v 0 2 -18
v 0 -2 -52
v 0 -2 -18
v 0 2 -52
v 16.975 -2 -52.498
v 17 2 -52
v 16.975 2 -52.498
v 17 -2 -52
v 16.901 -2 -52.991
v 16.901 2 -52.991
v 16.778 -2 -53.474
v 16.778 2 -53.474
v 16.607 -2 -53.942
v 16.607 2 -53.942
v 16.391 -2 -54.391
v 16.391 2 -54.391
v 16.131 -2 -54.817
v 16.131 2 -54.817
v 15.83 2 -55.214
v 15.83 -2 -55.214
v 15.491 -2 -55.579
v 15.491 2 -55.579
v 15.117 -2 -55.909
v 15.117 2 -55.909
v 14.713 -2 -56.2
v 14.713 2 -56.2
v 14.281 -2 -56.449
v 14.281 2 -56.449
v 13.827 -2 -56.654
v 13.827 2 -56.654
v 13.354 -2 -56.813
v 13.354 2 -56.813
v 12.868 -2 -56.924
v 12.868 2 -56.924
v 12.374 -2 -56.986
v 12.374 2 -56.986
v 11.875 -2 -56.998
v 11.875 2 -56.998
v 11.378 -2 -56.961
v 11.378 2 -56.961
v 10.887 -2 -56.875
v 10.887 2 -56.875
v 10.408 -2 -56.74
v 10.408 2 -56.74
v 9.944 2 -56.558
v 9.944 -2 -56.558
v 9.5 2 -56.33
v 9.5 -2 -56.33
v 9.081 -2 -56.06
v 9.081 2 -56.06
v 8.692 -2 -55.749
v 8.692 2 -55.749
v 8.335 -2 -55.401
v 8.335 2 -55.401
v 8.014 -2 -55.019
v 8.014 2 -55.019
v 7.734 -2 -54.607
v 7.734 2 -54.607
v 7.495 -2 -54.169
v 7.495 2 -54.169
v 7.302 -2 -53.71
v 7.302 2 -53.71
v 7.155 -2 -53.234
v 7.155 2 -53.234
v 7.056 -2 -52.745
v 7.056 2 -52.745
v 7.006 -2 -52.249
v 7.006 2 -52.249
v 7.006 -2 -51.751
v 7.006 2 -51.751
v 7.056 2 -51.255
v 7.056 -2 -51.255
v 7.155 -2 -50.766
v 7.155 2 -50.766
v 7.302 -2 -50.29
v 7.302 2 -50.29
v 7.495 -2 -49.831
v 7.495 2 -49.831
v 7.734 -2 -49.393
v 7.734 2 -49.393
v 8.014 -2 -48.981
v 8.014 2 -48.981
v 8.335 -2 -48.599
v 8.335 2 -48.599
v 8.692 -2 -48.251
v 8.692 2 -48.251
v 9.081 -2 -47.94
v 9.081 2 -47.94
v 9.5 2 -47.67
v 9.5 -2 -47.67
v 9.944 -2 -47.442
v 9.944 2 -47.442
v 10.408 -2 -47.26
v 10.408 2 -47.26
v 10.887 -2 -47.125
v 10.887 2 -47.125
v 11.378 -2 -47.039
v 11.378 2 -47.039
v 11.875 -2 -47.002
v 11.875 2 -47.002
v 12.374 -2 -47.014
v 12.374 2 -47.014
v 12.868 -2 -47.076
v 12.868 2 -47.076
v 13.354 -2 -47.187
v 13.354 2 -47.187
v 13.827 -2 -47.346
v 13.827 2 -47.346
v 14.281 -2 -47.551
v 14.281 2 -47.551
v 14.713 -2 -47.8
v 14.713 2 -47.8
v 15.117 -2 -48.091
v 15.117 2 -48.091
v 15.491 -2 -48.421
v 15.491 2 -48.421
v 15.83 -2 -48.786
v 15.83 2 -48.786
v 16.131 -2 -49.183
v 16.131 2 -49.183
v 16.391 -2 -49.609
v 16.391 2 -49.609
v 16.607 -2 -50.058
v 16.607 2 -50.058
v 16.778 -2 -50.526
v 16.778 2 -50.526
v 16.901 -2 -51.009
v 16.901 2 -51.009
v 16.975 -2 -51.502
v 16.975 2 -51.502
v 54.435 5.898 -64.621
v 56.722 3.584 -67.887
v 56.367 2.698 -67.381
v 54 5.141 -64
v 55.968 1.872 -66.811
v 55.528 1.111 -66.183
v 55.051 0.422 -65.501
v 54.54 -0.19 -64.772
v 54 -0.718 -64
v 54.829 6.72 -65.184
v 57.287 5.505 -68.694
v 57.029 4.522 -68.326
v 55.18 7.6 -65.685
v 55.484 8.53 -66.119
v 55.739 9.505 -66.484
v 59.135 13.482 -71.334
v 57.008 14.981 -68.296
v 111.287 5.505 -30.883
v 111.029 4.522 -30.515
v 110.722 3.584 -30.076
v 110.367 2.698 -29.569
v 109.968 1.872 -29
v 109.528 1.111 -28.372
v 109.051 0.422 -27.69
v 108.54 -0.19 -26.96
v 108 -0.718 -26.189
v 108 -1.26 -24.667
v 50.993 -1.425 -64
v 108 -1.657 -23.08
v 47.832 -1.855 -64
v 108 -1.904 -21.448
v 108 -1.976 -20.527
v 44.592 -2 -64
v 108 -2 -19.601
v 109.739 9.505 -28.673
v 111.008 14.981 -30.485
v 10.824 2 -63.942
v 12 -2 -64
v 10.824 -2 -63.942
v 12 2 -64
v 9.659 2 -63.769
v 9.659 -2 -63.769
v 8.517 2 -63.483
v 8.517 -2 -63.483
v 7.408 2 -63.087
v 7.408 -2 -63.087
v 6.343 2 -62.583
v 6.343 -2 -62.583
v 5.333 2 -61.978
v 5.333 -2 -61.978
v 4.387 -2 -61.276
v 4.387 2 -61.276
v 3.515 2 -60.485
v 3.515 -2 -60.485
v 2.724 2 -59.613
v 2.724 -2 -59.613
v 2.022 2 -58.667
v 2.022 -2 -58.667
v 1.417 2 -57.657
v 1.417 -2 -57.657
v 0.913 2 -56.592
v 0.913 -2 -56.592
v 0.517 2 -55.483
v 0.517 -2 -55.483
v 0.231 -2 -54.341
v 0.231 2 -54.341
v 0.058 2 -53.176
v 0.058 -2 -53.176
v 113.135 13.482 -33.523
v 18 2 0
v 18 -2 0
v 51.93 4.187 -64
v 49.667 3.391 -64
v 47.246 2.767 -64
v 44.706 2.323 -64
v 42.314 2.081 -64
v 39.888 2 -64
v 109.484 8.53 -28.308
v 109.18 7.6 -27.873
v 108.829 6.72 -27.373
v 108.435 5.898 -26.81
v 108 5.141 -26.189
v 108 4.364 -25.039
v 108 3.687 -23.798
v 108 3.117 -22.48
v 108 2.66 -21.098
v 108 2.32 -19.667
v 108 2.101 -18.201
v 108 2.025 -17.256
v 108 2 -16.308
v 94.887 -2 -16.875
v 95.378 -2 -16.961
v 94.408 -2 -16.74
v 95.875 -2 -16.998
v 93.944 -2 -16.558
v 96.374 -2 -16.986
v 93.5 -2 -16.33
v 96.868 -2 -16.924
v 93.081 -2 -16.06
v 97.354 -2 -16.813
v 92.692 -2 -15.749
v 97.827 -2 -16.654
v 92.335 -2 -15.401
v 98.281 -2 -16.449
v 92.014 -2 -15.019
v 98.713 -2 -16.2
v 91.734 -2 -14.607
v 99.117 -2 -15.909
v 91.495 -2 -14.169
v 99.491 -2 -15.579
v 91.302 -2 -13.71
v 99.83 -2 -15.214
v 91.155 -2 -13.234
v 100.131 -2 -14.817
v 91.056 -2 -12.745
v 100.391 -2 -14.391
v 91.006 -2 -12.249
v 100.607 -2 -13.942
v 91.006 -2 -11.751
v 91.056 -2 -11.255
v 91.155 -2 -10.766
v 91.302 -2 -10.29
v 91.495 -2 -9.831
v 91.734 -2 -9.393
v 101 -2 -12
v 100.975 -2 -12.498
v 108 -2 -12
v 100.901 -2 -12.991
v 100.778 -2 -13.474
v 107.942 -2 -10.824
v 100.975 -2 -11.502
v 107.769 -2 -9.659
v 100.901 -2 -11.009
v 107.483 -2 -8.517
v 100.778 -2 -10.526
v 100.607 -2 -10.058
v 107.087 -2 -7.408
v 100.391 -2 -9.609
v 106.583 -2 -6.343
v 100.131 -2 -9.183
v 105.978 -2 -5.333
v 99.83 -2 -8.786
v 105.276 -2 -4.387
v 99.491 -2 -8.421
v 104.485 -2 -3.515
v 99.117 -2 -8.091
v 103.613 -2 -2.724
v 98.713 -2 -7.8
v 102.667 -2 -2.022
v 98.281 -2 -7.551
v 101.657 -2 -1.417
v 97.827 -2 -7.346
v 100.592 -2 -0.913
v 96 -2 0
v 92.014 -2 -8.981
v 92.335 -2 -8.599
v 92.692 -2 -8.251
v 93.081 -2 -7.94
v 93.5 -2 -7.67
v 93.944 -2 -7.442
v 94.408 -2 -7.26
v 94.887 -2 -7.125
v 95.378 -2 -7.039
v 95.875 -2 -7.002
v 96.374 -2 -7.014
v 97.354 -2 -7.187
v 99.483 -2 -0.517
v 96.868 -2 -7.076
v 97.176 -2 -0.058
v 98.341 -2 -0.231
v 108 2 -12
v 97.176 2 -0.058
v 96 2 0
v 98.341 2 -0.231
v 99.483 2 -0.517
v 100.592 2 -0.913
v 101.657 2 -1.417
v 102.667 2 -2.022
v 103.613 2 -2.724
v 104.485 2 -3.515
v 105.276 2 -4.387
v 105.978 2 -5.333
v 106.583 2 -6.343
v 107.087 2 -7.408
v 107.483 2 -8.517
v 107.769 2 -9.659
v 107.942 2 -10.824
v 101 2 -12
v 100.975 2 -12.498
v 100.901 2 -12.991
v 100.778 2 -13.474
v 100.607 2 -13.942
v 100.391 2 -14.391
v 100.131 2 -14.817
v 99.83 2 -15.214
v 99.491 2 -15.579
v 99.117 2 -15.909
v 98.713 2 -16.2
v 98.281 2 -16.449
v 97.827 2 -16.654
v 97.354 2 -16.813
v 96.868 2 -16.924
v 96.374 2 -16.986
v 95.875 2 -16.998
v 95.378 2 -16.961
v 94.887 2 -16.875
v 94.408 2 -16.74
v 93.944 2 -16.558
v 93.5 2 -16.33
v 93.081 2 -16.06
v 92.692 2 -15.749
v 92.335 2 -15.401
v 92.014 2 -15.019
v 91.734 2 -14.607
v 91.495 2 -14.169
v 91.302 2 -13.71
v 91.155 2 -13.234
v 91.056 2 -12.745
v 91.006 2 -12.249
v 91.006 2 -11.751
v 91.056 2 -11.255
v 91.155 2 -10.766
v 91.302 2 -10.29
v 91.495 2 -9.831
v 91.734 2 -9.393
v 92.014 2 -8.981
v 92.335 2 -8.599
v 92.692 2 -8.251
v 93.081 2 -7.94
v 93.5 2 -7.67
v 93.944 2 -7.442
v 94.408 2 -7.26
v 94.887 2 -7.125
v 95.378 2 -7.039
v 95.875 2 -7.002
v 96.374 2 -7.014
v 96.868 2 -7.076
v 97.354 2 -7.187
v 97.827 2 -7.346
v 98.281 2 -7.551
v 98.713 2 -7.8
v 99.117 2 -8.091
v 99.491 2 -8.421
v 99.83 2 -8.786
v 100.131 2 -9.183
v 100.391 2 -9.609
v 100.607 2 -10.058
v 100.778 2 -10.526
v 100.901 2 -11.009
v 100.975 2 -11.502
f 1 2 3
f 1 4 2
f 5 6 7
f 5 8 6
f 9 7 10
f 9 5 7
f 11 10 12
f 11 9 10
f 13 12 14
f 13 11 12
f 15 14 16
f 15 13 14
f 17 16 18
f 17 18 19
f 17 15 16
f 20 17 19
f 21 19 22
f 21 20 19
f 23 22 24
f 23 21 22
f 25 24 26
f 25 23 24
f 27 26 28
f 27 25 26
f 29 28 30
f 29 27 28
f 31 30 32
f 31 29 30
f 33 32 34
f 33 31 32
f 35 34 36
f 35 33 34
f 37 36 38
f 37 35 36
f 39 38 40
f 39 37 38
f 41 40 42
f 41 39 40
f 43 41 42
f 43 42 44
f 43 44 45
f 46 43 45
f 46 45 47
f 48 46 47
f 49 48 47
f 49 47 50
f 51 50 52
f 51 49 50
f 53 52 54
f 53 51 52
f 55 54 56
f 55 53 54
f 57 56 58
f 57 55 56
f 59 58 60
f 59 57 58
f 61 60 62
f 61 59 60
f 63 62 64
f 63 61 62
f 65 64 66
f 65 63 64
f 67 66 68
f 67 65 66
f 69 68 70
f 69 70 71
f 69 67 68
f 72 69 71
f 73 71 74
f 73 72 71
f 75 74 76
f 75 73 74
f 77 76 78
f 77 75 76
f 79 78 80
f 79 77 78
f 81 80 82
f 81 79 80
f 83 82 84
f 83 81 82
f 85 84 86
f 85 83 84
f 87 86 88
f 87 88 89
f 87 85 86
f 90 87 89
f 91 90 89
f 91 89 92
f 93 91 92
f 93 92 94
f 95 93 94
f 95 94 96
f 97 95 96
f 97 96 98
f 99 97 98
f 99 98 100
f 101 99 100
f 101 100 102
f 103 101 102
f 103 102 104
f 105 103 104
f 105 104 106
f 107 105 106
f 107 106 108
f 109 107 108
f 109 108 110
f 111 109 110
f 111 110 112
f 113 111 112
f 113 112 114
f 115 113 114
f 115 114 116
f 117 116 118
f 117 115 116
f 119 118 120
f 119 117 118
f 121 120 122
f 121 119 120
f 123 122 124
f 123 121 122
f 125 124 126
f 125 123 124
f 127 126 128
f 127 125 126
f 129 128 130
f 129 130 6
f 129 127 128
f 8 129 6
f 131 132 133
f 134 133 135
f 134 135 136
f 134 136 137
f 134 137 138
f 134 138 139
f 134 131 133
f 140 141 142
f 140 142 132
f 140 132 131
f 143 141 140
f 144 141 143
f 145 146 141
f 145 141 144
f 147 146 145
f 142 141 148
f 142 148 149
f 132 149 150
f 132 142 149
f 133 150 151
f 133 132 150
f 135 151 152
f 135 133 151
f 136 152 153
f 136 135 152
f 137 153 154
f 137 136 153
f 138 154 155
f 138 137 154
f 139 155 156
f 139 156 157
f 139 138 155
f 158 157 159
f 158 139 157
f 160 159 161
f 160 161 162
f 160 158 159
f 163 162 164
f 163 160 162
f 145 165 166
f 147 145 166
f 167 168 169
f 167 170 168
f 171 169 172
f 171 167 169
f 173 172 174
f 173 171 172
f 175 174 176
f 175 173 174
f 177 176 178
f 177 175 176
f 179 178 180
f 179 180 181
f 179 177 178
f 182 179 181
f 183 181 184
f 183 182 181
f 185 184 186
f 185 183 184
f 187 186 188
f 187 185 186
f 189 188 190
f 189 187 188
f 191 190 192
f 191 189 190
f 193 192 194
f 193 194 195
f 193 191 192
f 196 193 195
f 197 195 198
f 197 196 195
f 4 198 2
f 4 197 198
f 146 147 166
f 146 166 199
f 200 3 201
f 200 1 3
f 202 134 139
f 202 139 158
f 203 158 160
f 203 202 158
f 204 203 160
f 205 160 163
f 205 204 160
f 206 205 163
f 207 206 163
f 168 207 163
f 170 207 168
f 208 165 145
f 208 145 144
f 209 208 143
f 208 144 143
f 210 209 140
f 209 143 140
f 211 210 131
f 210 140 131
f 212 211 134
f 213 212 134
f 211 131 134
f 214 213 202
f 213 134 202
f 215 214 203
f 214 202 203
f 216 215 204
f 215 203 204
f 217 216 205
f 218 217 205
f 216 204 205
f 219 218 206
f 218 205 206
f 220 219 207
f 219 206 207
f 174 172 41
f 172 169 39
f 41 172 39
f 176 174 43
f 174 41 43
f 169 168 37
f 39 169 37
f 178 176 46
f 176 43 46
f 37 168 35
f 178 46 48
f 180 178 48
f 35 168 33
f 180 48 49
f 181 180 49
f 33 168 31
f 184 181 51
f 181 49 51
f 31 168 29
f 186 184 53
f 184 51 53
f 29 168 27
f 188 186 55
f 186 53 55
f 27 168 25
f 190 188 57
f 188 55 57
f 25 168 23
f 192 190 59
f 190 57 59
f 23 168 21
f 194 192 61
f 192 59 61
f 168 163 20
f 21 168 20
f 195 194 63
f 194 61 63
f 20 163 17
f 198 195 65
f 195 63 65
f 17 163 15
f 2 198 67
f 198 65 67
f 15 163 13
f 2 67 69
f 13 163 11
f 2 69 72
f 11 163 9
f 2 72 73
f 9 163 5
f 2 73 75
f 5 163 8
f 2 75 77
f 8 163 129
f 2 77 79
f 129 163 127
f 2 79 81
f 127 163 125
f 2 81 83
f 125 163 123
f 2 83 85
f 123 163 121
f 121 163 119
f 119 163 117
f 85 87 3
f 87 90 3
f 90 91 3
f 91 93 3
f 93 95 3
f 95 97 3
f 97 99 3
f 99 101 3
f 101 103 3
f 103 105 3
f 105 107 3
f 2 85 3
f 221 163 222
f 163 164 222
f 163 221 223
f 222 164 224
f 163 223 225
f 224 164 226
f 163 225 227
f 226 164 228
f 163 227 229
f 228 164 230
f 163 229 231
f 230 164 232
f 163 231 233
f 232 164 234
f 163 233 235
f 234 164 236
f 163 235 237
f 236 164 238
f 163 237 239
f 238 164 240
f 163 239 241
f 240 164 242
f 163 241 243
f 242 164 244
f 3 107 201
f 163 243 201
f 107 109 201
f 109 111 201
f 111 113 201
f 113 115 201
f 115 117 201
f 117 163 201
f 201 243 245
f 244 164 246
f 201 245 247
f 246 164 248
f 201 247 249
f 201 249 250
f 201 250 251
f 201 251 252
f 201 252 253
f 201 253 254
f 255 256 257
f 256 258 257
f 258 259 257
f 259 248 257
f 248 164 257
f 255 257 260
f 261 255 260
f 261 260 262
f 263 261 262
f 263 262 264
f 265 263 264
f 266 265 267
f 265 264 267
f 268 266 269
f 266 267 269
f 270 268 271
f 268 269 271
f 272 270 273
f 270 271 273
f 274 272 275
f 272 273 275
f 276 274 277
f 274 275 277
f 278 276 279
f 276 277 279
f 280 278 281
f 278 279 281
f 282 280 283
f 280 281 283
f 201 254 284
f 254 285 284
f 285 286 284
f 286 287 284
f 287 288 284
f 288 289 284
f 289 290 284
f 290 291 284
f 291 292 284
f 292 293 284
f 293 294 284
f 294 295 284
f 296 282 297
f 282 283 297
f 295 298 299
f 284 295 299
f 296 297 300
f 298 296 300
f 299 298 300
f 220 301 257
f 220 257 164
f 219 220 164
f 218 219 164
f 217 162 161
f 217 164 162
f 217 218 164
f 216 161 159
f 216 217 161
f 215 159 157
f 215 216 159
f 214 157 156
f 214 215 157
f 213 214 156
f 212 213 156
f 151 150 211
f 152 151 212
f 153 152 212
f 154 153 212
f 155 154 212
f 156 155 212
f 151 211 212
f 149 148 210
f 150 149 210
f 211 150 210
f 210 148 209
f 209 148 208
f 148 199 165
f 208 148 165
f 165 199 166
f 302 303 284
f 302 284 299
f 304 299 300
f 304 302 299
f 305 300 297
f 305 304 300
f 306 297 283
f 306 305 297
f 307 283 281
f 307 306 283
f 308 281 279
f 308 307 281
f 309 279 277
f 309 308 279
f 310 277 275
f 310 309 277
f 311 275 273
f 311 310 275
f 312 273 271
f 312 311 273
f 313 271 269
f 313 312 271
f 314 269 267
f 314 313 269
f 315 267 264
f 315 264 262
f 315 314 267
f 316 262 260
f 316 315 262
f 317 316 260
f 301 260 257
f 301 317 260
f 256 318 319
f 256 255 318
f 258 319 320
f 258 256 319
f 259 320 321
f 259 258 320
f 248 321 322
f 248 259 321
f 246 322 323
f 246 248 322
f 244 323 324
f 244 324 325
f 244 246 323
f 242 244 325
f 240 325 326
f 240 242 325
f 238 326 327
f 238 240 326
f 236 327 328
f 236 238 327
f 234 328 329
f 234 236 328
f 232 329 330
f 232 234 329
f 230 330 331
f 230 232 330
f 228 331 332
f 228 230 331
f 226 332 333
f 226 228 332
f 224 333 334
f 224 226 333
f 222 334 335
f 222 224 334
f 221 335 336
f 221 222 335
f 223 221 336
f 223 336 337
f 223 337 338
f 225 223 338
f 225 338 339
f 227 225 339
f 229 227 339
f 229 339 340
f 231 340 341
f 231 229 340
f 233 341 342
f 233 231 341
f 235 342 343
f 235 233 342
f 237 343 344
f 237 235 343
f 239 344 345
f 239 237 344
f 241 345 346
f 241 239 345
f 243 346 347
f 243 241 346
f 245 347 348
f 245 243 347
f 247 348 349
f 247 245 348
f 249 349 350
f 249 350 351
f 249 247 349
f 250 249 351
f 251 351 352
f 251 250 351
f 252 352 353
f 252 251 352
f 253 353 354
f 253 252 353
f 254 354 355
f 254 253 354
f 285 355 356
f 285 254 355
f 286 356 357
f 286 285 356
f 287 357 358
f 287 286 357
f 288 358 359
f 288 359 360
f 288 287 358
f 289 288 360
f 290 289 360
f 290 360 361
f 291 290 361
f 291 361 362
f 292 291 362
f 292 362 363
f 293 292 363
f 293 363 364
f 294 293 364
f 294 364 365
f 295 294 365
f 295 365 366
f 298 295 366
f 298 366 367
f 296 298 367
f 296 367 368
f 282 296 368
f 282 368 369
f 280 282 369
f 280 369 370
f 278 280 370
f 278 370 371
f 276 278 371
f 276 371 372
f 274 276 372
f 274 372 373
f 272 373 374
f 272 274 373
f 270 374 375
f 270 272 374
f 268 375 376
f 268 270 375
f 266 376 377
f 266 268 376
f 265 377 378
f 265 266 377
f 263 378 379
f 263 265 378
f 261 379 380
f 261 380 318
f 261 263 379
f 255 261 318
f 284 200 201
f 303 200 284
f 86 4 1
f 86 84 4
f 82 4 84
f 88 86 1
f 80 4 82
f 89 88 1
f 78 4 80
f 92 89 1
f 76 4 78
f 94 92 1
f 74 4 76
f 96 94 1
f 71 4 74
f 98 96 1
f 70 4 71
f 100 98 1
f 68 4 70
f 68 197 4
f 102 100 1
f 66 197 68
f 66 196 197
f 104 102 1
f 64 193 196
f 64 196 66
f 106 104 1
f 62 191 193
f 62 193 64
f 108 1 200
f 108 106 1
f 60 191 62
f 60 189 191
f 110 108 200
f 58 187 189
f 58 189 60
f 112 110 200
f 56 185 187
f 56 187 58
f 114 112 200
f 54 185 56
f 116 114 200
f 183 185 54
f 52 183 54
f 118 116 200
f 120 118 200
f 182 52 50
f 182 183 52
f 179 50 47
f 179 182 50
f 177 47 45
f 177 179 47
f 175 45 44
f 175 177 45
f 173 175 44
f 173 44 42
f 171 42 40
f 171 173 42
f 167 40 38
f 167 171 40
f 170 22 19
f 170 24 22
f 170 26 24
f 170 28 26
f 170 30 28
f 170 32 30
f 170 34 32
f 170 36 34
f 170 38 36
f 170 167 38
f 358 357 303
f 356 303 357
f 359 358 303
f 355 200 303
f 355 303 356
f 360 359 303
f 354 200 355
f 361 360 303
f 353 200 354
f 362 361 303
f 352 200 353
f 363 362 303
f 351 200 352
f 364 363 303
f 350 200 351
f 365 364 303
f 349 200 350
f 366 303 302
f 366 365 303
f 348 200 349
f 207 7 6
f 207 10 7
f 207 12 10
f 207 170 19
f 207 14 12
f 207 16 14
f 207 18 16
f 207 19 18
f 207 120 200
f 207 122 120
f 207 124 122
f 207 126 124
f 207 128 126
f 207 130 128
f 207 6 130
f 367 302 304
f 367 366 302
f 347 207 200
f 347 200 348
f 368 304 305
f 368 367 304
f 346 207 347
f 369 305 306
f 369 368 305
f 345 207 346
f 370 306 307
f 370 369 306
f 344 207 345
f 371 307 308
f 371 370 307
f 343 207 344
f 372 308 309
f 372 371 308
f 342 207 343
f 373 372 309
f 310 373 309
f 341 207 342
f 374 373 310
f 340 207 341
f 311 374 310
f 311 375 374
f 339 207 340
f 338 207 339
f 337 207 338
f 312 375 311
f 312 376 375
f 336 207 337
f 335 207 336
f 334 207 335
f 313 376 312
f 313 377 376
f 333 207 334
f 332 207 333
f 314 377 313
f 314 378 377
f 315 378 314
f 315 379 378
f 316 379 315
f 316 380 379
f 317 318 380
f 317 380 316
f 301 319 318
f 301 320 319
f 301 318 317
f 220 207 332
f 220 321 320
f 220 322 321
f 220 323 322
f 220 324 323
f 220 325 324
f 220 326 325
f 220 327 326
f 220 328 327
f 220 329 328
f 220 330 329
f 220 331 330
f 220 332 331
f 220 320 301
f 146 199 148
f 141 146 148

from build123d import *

# Parameters (mm, degrees)
SKETCH1_R           = 5
BOSS_EXTRUDE1_DEPTH = 2
BOSS_EXTRUDE2_DEPTH = 65.921828
FILLET1_R           = 12
FILLET2_R           = 12


with BuildPart() as part:
    # Sketch1 → Boss-Extrude1 (new body, symmetric)
    with BuildSketch(Plane(origin=(0, 0, 0), x_dir=(1, 0, 0), z_dir=(0, 1, 0))):
        with BuildLine():
            Line((0, 18), (18, 0))
            Line((18, 0), (96, 0))
            ThreePointArc((96, 0), (104.485281374, 3.514718626), (108, 12))
            Line((108, 12), (108, 26.188792937))
            Line((108, 26.188792937), (54, 64))
            Line((54, 64), (12, 64))
            ThreePointArc((12, 64), (3.514718626, 60.485281374), (0, 52))
            Line((0, 52), (0, 18))
        make_face()
        with Locations((12, 52)):
            Circle(SKETCH1_R, mode=Mode.SUBTRACT)
        with Locations((96, 12)):
            Circle(SKETCH1_R, mode=Mode.SUBTRACT)
    extrude(amount=BOSS_EXTRUDE1_DEPTH, both=True)

    # Sketch4 → Boss-Extrude2 (add)
    with BuildSketch(Plane(origin=(60.164380005, 0, 42.127552411), x_dir=(0.573576436, 0, -0.819152044), z_dir=(0.819152044, 0, 0.573576436))):
        Polygon((83.398858397, 2), (88.643350705, 14.980573964), (92.352086124, 13.48214759), (86.096892465, -2), (83.398858397, -2), align=None)
    extrude(amount=-BOSS_EXTRUDE2_DEPTH)

    # Fillet1
    fillet1_edges = [part.edges().sort_by_distance(p)[0] for p in [
        (82.547528681, -2, -47.30449665),
    ]]
    fillet(fillet1_edges, radius=FILLET1_R)

    # Fillet2
    fillet2_edges = [part.edges().sort_by_distance(p)[0] for p in [
        (81, 2, -45.094396468),
    ]]
    fillet(fillet2_edges, radius=FILLET2_R)


solid = part.part
